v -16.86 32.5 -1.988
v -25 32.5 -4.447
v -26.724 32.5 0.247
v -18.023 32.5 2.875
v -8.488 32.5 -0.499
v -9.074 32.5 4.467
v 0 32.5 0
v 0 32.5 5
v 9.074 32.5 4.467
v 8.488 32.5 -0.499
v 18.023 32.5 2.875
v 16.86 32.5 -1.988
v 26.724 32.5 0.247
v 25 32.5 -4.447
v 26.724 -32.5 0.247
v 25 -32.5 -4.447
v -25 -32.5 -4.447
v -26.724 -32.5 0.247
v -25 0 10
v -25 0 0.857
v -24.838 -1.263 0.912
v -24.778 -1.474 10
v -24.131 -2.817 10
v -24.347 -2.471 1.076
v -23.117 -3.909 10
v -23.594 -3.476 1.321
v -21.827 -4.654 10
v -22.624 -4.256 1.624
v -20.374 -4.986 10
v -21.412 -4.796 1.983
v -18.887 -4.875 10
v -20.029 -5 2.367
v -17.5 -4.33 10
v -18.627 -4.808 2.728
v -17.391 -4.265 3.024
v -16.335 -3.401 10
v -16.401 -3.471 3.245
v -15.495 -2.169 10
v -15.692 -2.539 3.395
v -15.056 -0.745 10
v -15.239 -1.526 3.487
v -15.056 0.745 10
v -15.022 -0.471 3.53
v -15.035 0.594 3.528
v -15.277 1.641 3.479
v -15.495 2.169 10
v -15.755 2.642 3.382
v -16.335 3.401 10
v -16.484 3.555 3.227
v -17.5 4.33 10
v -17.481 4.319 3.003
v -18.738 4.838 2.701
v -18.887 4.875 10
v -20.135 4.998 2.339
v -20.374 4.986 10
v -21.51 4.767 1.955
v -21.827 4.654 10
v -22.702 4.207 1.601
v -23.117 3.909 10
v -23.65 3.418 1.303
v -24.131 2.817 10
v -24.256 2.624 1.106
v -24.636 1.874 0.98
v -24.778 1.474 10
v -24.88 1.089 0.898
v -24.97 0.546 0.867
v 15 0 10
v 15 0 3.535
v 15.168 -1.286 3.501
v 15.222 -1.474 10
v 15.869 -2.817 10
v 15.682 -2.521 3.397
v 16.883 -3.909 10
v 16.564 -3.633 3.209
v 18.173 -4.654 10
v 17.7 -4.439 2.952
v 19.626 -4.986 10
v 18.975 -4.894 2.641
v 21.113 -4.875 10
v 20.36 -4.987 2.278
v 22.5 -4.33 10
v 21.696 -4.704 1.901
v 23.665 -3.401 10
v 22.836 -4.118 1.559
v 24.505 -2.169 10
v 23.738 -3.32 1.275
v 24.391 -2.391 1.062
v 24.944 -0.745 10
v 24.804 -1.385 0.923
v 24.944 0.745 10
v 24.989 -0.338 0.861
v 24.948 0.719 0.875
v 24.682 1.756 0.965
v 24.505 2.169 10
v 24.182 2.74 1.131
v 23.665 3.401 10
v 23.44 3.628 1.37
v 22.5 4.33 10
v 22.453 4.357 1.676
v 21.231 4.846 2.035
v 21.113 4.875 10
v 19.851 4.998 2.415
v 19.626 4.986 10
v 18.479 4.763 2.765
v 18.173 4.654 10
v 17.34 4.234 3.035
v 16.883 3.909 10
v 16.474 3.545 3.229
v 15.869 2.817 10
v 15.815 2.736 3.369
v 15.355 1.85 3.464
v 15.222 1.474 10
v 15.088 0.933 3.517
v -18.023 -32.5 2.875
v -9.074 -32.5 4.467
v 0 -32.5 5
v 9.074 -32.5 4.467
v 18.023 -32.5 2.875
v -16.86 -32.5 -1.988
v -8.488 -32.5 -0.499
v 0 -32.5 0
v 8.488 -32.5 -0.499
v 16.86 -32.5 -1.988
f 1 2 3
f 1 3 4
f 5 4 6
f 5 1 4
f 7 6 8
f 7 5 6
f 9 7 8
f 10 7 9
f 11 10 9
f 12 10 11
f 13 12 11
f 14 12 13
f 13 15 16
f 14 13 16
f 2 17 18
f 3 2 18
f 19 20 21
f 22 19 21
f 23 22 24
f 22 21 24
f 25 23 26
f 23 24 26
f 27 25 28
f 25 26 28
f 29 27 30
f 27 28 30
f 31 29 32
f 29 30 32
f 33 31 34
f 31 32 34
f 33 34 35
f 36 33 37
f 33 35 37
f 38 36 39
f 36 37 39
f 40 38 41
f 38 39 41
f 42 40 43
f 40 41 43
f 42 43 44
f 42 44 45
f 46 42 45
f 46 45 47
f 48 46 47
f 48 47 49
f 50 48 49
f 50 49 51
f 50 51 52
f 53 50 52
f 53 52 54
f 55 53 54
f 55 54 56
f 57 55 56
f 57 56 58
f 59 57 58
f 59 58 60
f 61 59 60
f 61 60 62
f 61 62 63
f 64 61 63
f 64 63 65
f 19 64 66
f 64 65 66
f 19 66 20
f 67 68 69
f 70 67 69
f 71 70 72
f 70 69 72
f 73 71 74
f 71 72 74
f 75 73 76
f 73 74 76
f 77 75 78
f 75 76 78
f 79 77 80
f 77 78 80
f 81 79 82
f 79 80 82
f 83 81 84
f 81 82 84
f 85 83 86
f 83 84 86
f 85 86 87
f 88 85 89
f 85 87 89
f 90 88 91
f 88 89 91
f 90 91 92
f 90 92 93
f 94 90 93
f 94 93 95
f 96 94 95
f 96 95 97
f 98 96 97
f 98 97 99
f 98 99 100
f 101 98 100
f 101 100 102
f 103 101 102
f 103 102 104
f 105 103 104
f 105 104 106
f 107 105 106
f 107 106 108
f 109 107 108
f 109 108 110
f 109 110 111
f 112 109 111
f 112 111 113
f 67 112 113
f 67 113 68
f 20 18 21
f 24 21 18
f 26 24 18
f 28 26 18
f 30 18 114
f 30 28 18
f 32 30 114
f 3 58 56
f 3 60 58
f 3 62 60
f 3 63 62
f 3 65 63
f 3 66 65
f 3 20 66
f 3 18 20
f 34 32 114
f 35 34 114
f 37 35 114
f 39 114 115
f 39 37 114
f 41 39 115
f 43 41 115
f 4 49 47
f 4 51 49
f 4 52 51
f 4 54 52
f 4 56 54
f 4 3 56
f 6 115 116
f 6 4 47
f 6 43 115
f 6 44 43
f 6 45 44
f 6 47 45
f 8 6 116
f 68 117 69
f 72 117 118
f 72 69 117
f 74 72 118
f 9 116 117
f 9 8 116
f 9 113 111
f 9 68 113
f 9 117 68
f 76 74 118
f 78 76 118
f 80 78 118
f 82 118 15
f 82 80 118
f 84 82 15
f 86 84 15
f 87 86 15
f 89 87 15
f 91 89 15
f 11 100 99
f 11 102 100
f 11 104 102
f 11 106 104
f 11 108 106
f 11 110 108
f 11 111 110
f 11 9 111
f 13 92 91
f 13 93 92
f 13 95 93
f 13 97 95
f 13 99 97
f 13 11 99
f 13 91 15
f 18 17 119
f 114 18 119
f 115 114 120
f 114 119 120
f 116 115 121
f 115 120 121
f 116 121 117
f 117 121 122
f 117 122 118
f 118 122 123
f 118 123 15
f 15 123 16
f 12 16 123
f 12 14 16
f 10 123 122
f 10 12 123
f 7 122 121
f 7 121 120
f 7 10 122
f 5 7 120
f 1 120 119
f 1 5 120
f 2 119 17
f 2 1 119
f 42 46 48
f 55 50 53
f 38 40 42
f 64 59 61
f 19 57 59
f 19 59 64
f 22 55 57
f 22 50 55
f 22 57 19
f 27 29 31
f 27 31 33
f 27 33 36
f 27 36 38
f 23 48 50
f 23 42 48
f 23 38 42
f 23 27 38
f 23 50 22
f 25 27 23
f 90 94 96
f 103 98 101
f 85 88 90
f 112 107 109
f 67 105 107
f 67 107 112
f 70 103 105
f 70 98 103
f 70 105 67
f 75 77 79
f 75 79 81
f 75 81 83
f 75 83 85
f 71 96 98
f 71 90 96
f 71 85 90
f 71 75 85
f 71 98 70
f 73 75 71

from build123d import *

# Parameters (mm, degrees)
BOSS_EXTRUDE1_DEPTH = 32.5
SKETCH2_R           = 5
BOSS_EXTRUDE2_DEPTH = 10


with BuildPart() as part:
    # Sketch1 → Boss-Extrude1 (new, symmetric)
    with BuildSketch(Plane(origin=(0, 0, 0), x_dir=(1, 0, 0), z_dir=(0, 1, 0))):
        with BuildLine():
            Line((-25, 4.446712056), (-26.724137931, -0.246618147))
            ThreePointArc((-26.724137931, -0.246618147), (0, -5), (26.724137931, -0.246618147))
            Line((26.724137931, -0.246618147), (25, 4.446712056))
            ThreePointArc((25, 4.446712056), (0, 0), (-25, 4.446712056))
        make_face()
    extrude(amount=BOSS_EXTRUDE1_DEPTH, both=True)

    # Sketch2 → Boss-Extrude2 (add)
    with BuildSketch(Plane.XY):
        with Locations(Location((-20, 0, 0), (0, 0, 180))):
            Circle(SKETCH2_R)
        with Locations(Location((20, 0, 0), (0, 0, 180))):
            Circle(SKETCH2_R)
    extrude(amount=BOSS_EXTRUDE2_DEPTH)


solid = part.part
